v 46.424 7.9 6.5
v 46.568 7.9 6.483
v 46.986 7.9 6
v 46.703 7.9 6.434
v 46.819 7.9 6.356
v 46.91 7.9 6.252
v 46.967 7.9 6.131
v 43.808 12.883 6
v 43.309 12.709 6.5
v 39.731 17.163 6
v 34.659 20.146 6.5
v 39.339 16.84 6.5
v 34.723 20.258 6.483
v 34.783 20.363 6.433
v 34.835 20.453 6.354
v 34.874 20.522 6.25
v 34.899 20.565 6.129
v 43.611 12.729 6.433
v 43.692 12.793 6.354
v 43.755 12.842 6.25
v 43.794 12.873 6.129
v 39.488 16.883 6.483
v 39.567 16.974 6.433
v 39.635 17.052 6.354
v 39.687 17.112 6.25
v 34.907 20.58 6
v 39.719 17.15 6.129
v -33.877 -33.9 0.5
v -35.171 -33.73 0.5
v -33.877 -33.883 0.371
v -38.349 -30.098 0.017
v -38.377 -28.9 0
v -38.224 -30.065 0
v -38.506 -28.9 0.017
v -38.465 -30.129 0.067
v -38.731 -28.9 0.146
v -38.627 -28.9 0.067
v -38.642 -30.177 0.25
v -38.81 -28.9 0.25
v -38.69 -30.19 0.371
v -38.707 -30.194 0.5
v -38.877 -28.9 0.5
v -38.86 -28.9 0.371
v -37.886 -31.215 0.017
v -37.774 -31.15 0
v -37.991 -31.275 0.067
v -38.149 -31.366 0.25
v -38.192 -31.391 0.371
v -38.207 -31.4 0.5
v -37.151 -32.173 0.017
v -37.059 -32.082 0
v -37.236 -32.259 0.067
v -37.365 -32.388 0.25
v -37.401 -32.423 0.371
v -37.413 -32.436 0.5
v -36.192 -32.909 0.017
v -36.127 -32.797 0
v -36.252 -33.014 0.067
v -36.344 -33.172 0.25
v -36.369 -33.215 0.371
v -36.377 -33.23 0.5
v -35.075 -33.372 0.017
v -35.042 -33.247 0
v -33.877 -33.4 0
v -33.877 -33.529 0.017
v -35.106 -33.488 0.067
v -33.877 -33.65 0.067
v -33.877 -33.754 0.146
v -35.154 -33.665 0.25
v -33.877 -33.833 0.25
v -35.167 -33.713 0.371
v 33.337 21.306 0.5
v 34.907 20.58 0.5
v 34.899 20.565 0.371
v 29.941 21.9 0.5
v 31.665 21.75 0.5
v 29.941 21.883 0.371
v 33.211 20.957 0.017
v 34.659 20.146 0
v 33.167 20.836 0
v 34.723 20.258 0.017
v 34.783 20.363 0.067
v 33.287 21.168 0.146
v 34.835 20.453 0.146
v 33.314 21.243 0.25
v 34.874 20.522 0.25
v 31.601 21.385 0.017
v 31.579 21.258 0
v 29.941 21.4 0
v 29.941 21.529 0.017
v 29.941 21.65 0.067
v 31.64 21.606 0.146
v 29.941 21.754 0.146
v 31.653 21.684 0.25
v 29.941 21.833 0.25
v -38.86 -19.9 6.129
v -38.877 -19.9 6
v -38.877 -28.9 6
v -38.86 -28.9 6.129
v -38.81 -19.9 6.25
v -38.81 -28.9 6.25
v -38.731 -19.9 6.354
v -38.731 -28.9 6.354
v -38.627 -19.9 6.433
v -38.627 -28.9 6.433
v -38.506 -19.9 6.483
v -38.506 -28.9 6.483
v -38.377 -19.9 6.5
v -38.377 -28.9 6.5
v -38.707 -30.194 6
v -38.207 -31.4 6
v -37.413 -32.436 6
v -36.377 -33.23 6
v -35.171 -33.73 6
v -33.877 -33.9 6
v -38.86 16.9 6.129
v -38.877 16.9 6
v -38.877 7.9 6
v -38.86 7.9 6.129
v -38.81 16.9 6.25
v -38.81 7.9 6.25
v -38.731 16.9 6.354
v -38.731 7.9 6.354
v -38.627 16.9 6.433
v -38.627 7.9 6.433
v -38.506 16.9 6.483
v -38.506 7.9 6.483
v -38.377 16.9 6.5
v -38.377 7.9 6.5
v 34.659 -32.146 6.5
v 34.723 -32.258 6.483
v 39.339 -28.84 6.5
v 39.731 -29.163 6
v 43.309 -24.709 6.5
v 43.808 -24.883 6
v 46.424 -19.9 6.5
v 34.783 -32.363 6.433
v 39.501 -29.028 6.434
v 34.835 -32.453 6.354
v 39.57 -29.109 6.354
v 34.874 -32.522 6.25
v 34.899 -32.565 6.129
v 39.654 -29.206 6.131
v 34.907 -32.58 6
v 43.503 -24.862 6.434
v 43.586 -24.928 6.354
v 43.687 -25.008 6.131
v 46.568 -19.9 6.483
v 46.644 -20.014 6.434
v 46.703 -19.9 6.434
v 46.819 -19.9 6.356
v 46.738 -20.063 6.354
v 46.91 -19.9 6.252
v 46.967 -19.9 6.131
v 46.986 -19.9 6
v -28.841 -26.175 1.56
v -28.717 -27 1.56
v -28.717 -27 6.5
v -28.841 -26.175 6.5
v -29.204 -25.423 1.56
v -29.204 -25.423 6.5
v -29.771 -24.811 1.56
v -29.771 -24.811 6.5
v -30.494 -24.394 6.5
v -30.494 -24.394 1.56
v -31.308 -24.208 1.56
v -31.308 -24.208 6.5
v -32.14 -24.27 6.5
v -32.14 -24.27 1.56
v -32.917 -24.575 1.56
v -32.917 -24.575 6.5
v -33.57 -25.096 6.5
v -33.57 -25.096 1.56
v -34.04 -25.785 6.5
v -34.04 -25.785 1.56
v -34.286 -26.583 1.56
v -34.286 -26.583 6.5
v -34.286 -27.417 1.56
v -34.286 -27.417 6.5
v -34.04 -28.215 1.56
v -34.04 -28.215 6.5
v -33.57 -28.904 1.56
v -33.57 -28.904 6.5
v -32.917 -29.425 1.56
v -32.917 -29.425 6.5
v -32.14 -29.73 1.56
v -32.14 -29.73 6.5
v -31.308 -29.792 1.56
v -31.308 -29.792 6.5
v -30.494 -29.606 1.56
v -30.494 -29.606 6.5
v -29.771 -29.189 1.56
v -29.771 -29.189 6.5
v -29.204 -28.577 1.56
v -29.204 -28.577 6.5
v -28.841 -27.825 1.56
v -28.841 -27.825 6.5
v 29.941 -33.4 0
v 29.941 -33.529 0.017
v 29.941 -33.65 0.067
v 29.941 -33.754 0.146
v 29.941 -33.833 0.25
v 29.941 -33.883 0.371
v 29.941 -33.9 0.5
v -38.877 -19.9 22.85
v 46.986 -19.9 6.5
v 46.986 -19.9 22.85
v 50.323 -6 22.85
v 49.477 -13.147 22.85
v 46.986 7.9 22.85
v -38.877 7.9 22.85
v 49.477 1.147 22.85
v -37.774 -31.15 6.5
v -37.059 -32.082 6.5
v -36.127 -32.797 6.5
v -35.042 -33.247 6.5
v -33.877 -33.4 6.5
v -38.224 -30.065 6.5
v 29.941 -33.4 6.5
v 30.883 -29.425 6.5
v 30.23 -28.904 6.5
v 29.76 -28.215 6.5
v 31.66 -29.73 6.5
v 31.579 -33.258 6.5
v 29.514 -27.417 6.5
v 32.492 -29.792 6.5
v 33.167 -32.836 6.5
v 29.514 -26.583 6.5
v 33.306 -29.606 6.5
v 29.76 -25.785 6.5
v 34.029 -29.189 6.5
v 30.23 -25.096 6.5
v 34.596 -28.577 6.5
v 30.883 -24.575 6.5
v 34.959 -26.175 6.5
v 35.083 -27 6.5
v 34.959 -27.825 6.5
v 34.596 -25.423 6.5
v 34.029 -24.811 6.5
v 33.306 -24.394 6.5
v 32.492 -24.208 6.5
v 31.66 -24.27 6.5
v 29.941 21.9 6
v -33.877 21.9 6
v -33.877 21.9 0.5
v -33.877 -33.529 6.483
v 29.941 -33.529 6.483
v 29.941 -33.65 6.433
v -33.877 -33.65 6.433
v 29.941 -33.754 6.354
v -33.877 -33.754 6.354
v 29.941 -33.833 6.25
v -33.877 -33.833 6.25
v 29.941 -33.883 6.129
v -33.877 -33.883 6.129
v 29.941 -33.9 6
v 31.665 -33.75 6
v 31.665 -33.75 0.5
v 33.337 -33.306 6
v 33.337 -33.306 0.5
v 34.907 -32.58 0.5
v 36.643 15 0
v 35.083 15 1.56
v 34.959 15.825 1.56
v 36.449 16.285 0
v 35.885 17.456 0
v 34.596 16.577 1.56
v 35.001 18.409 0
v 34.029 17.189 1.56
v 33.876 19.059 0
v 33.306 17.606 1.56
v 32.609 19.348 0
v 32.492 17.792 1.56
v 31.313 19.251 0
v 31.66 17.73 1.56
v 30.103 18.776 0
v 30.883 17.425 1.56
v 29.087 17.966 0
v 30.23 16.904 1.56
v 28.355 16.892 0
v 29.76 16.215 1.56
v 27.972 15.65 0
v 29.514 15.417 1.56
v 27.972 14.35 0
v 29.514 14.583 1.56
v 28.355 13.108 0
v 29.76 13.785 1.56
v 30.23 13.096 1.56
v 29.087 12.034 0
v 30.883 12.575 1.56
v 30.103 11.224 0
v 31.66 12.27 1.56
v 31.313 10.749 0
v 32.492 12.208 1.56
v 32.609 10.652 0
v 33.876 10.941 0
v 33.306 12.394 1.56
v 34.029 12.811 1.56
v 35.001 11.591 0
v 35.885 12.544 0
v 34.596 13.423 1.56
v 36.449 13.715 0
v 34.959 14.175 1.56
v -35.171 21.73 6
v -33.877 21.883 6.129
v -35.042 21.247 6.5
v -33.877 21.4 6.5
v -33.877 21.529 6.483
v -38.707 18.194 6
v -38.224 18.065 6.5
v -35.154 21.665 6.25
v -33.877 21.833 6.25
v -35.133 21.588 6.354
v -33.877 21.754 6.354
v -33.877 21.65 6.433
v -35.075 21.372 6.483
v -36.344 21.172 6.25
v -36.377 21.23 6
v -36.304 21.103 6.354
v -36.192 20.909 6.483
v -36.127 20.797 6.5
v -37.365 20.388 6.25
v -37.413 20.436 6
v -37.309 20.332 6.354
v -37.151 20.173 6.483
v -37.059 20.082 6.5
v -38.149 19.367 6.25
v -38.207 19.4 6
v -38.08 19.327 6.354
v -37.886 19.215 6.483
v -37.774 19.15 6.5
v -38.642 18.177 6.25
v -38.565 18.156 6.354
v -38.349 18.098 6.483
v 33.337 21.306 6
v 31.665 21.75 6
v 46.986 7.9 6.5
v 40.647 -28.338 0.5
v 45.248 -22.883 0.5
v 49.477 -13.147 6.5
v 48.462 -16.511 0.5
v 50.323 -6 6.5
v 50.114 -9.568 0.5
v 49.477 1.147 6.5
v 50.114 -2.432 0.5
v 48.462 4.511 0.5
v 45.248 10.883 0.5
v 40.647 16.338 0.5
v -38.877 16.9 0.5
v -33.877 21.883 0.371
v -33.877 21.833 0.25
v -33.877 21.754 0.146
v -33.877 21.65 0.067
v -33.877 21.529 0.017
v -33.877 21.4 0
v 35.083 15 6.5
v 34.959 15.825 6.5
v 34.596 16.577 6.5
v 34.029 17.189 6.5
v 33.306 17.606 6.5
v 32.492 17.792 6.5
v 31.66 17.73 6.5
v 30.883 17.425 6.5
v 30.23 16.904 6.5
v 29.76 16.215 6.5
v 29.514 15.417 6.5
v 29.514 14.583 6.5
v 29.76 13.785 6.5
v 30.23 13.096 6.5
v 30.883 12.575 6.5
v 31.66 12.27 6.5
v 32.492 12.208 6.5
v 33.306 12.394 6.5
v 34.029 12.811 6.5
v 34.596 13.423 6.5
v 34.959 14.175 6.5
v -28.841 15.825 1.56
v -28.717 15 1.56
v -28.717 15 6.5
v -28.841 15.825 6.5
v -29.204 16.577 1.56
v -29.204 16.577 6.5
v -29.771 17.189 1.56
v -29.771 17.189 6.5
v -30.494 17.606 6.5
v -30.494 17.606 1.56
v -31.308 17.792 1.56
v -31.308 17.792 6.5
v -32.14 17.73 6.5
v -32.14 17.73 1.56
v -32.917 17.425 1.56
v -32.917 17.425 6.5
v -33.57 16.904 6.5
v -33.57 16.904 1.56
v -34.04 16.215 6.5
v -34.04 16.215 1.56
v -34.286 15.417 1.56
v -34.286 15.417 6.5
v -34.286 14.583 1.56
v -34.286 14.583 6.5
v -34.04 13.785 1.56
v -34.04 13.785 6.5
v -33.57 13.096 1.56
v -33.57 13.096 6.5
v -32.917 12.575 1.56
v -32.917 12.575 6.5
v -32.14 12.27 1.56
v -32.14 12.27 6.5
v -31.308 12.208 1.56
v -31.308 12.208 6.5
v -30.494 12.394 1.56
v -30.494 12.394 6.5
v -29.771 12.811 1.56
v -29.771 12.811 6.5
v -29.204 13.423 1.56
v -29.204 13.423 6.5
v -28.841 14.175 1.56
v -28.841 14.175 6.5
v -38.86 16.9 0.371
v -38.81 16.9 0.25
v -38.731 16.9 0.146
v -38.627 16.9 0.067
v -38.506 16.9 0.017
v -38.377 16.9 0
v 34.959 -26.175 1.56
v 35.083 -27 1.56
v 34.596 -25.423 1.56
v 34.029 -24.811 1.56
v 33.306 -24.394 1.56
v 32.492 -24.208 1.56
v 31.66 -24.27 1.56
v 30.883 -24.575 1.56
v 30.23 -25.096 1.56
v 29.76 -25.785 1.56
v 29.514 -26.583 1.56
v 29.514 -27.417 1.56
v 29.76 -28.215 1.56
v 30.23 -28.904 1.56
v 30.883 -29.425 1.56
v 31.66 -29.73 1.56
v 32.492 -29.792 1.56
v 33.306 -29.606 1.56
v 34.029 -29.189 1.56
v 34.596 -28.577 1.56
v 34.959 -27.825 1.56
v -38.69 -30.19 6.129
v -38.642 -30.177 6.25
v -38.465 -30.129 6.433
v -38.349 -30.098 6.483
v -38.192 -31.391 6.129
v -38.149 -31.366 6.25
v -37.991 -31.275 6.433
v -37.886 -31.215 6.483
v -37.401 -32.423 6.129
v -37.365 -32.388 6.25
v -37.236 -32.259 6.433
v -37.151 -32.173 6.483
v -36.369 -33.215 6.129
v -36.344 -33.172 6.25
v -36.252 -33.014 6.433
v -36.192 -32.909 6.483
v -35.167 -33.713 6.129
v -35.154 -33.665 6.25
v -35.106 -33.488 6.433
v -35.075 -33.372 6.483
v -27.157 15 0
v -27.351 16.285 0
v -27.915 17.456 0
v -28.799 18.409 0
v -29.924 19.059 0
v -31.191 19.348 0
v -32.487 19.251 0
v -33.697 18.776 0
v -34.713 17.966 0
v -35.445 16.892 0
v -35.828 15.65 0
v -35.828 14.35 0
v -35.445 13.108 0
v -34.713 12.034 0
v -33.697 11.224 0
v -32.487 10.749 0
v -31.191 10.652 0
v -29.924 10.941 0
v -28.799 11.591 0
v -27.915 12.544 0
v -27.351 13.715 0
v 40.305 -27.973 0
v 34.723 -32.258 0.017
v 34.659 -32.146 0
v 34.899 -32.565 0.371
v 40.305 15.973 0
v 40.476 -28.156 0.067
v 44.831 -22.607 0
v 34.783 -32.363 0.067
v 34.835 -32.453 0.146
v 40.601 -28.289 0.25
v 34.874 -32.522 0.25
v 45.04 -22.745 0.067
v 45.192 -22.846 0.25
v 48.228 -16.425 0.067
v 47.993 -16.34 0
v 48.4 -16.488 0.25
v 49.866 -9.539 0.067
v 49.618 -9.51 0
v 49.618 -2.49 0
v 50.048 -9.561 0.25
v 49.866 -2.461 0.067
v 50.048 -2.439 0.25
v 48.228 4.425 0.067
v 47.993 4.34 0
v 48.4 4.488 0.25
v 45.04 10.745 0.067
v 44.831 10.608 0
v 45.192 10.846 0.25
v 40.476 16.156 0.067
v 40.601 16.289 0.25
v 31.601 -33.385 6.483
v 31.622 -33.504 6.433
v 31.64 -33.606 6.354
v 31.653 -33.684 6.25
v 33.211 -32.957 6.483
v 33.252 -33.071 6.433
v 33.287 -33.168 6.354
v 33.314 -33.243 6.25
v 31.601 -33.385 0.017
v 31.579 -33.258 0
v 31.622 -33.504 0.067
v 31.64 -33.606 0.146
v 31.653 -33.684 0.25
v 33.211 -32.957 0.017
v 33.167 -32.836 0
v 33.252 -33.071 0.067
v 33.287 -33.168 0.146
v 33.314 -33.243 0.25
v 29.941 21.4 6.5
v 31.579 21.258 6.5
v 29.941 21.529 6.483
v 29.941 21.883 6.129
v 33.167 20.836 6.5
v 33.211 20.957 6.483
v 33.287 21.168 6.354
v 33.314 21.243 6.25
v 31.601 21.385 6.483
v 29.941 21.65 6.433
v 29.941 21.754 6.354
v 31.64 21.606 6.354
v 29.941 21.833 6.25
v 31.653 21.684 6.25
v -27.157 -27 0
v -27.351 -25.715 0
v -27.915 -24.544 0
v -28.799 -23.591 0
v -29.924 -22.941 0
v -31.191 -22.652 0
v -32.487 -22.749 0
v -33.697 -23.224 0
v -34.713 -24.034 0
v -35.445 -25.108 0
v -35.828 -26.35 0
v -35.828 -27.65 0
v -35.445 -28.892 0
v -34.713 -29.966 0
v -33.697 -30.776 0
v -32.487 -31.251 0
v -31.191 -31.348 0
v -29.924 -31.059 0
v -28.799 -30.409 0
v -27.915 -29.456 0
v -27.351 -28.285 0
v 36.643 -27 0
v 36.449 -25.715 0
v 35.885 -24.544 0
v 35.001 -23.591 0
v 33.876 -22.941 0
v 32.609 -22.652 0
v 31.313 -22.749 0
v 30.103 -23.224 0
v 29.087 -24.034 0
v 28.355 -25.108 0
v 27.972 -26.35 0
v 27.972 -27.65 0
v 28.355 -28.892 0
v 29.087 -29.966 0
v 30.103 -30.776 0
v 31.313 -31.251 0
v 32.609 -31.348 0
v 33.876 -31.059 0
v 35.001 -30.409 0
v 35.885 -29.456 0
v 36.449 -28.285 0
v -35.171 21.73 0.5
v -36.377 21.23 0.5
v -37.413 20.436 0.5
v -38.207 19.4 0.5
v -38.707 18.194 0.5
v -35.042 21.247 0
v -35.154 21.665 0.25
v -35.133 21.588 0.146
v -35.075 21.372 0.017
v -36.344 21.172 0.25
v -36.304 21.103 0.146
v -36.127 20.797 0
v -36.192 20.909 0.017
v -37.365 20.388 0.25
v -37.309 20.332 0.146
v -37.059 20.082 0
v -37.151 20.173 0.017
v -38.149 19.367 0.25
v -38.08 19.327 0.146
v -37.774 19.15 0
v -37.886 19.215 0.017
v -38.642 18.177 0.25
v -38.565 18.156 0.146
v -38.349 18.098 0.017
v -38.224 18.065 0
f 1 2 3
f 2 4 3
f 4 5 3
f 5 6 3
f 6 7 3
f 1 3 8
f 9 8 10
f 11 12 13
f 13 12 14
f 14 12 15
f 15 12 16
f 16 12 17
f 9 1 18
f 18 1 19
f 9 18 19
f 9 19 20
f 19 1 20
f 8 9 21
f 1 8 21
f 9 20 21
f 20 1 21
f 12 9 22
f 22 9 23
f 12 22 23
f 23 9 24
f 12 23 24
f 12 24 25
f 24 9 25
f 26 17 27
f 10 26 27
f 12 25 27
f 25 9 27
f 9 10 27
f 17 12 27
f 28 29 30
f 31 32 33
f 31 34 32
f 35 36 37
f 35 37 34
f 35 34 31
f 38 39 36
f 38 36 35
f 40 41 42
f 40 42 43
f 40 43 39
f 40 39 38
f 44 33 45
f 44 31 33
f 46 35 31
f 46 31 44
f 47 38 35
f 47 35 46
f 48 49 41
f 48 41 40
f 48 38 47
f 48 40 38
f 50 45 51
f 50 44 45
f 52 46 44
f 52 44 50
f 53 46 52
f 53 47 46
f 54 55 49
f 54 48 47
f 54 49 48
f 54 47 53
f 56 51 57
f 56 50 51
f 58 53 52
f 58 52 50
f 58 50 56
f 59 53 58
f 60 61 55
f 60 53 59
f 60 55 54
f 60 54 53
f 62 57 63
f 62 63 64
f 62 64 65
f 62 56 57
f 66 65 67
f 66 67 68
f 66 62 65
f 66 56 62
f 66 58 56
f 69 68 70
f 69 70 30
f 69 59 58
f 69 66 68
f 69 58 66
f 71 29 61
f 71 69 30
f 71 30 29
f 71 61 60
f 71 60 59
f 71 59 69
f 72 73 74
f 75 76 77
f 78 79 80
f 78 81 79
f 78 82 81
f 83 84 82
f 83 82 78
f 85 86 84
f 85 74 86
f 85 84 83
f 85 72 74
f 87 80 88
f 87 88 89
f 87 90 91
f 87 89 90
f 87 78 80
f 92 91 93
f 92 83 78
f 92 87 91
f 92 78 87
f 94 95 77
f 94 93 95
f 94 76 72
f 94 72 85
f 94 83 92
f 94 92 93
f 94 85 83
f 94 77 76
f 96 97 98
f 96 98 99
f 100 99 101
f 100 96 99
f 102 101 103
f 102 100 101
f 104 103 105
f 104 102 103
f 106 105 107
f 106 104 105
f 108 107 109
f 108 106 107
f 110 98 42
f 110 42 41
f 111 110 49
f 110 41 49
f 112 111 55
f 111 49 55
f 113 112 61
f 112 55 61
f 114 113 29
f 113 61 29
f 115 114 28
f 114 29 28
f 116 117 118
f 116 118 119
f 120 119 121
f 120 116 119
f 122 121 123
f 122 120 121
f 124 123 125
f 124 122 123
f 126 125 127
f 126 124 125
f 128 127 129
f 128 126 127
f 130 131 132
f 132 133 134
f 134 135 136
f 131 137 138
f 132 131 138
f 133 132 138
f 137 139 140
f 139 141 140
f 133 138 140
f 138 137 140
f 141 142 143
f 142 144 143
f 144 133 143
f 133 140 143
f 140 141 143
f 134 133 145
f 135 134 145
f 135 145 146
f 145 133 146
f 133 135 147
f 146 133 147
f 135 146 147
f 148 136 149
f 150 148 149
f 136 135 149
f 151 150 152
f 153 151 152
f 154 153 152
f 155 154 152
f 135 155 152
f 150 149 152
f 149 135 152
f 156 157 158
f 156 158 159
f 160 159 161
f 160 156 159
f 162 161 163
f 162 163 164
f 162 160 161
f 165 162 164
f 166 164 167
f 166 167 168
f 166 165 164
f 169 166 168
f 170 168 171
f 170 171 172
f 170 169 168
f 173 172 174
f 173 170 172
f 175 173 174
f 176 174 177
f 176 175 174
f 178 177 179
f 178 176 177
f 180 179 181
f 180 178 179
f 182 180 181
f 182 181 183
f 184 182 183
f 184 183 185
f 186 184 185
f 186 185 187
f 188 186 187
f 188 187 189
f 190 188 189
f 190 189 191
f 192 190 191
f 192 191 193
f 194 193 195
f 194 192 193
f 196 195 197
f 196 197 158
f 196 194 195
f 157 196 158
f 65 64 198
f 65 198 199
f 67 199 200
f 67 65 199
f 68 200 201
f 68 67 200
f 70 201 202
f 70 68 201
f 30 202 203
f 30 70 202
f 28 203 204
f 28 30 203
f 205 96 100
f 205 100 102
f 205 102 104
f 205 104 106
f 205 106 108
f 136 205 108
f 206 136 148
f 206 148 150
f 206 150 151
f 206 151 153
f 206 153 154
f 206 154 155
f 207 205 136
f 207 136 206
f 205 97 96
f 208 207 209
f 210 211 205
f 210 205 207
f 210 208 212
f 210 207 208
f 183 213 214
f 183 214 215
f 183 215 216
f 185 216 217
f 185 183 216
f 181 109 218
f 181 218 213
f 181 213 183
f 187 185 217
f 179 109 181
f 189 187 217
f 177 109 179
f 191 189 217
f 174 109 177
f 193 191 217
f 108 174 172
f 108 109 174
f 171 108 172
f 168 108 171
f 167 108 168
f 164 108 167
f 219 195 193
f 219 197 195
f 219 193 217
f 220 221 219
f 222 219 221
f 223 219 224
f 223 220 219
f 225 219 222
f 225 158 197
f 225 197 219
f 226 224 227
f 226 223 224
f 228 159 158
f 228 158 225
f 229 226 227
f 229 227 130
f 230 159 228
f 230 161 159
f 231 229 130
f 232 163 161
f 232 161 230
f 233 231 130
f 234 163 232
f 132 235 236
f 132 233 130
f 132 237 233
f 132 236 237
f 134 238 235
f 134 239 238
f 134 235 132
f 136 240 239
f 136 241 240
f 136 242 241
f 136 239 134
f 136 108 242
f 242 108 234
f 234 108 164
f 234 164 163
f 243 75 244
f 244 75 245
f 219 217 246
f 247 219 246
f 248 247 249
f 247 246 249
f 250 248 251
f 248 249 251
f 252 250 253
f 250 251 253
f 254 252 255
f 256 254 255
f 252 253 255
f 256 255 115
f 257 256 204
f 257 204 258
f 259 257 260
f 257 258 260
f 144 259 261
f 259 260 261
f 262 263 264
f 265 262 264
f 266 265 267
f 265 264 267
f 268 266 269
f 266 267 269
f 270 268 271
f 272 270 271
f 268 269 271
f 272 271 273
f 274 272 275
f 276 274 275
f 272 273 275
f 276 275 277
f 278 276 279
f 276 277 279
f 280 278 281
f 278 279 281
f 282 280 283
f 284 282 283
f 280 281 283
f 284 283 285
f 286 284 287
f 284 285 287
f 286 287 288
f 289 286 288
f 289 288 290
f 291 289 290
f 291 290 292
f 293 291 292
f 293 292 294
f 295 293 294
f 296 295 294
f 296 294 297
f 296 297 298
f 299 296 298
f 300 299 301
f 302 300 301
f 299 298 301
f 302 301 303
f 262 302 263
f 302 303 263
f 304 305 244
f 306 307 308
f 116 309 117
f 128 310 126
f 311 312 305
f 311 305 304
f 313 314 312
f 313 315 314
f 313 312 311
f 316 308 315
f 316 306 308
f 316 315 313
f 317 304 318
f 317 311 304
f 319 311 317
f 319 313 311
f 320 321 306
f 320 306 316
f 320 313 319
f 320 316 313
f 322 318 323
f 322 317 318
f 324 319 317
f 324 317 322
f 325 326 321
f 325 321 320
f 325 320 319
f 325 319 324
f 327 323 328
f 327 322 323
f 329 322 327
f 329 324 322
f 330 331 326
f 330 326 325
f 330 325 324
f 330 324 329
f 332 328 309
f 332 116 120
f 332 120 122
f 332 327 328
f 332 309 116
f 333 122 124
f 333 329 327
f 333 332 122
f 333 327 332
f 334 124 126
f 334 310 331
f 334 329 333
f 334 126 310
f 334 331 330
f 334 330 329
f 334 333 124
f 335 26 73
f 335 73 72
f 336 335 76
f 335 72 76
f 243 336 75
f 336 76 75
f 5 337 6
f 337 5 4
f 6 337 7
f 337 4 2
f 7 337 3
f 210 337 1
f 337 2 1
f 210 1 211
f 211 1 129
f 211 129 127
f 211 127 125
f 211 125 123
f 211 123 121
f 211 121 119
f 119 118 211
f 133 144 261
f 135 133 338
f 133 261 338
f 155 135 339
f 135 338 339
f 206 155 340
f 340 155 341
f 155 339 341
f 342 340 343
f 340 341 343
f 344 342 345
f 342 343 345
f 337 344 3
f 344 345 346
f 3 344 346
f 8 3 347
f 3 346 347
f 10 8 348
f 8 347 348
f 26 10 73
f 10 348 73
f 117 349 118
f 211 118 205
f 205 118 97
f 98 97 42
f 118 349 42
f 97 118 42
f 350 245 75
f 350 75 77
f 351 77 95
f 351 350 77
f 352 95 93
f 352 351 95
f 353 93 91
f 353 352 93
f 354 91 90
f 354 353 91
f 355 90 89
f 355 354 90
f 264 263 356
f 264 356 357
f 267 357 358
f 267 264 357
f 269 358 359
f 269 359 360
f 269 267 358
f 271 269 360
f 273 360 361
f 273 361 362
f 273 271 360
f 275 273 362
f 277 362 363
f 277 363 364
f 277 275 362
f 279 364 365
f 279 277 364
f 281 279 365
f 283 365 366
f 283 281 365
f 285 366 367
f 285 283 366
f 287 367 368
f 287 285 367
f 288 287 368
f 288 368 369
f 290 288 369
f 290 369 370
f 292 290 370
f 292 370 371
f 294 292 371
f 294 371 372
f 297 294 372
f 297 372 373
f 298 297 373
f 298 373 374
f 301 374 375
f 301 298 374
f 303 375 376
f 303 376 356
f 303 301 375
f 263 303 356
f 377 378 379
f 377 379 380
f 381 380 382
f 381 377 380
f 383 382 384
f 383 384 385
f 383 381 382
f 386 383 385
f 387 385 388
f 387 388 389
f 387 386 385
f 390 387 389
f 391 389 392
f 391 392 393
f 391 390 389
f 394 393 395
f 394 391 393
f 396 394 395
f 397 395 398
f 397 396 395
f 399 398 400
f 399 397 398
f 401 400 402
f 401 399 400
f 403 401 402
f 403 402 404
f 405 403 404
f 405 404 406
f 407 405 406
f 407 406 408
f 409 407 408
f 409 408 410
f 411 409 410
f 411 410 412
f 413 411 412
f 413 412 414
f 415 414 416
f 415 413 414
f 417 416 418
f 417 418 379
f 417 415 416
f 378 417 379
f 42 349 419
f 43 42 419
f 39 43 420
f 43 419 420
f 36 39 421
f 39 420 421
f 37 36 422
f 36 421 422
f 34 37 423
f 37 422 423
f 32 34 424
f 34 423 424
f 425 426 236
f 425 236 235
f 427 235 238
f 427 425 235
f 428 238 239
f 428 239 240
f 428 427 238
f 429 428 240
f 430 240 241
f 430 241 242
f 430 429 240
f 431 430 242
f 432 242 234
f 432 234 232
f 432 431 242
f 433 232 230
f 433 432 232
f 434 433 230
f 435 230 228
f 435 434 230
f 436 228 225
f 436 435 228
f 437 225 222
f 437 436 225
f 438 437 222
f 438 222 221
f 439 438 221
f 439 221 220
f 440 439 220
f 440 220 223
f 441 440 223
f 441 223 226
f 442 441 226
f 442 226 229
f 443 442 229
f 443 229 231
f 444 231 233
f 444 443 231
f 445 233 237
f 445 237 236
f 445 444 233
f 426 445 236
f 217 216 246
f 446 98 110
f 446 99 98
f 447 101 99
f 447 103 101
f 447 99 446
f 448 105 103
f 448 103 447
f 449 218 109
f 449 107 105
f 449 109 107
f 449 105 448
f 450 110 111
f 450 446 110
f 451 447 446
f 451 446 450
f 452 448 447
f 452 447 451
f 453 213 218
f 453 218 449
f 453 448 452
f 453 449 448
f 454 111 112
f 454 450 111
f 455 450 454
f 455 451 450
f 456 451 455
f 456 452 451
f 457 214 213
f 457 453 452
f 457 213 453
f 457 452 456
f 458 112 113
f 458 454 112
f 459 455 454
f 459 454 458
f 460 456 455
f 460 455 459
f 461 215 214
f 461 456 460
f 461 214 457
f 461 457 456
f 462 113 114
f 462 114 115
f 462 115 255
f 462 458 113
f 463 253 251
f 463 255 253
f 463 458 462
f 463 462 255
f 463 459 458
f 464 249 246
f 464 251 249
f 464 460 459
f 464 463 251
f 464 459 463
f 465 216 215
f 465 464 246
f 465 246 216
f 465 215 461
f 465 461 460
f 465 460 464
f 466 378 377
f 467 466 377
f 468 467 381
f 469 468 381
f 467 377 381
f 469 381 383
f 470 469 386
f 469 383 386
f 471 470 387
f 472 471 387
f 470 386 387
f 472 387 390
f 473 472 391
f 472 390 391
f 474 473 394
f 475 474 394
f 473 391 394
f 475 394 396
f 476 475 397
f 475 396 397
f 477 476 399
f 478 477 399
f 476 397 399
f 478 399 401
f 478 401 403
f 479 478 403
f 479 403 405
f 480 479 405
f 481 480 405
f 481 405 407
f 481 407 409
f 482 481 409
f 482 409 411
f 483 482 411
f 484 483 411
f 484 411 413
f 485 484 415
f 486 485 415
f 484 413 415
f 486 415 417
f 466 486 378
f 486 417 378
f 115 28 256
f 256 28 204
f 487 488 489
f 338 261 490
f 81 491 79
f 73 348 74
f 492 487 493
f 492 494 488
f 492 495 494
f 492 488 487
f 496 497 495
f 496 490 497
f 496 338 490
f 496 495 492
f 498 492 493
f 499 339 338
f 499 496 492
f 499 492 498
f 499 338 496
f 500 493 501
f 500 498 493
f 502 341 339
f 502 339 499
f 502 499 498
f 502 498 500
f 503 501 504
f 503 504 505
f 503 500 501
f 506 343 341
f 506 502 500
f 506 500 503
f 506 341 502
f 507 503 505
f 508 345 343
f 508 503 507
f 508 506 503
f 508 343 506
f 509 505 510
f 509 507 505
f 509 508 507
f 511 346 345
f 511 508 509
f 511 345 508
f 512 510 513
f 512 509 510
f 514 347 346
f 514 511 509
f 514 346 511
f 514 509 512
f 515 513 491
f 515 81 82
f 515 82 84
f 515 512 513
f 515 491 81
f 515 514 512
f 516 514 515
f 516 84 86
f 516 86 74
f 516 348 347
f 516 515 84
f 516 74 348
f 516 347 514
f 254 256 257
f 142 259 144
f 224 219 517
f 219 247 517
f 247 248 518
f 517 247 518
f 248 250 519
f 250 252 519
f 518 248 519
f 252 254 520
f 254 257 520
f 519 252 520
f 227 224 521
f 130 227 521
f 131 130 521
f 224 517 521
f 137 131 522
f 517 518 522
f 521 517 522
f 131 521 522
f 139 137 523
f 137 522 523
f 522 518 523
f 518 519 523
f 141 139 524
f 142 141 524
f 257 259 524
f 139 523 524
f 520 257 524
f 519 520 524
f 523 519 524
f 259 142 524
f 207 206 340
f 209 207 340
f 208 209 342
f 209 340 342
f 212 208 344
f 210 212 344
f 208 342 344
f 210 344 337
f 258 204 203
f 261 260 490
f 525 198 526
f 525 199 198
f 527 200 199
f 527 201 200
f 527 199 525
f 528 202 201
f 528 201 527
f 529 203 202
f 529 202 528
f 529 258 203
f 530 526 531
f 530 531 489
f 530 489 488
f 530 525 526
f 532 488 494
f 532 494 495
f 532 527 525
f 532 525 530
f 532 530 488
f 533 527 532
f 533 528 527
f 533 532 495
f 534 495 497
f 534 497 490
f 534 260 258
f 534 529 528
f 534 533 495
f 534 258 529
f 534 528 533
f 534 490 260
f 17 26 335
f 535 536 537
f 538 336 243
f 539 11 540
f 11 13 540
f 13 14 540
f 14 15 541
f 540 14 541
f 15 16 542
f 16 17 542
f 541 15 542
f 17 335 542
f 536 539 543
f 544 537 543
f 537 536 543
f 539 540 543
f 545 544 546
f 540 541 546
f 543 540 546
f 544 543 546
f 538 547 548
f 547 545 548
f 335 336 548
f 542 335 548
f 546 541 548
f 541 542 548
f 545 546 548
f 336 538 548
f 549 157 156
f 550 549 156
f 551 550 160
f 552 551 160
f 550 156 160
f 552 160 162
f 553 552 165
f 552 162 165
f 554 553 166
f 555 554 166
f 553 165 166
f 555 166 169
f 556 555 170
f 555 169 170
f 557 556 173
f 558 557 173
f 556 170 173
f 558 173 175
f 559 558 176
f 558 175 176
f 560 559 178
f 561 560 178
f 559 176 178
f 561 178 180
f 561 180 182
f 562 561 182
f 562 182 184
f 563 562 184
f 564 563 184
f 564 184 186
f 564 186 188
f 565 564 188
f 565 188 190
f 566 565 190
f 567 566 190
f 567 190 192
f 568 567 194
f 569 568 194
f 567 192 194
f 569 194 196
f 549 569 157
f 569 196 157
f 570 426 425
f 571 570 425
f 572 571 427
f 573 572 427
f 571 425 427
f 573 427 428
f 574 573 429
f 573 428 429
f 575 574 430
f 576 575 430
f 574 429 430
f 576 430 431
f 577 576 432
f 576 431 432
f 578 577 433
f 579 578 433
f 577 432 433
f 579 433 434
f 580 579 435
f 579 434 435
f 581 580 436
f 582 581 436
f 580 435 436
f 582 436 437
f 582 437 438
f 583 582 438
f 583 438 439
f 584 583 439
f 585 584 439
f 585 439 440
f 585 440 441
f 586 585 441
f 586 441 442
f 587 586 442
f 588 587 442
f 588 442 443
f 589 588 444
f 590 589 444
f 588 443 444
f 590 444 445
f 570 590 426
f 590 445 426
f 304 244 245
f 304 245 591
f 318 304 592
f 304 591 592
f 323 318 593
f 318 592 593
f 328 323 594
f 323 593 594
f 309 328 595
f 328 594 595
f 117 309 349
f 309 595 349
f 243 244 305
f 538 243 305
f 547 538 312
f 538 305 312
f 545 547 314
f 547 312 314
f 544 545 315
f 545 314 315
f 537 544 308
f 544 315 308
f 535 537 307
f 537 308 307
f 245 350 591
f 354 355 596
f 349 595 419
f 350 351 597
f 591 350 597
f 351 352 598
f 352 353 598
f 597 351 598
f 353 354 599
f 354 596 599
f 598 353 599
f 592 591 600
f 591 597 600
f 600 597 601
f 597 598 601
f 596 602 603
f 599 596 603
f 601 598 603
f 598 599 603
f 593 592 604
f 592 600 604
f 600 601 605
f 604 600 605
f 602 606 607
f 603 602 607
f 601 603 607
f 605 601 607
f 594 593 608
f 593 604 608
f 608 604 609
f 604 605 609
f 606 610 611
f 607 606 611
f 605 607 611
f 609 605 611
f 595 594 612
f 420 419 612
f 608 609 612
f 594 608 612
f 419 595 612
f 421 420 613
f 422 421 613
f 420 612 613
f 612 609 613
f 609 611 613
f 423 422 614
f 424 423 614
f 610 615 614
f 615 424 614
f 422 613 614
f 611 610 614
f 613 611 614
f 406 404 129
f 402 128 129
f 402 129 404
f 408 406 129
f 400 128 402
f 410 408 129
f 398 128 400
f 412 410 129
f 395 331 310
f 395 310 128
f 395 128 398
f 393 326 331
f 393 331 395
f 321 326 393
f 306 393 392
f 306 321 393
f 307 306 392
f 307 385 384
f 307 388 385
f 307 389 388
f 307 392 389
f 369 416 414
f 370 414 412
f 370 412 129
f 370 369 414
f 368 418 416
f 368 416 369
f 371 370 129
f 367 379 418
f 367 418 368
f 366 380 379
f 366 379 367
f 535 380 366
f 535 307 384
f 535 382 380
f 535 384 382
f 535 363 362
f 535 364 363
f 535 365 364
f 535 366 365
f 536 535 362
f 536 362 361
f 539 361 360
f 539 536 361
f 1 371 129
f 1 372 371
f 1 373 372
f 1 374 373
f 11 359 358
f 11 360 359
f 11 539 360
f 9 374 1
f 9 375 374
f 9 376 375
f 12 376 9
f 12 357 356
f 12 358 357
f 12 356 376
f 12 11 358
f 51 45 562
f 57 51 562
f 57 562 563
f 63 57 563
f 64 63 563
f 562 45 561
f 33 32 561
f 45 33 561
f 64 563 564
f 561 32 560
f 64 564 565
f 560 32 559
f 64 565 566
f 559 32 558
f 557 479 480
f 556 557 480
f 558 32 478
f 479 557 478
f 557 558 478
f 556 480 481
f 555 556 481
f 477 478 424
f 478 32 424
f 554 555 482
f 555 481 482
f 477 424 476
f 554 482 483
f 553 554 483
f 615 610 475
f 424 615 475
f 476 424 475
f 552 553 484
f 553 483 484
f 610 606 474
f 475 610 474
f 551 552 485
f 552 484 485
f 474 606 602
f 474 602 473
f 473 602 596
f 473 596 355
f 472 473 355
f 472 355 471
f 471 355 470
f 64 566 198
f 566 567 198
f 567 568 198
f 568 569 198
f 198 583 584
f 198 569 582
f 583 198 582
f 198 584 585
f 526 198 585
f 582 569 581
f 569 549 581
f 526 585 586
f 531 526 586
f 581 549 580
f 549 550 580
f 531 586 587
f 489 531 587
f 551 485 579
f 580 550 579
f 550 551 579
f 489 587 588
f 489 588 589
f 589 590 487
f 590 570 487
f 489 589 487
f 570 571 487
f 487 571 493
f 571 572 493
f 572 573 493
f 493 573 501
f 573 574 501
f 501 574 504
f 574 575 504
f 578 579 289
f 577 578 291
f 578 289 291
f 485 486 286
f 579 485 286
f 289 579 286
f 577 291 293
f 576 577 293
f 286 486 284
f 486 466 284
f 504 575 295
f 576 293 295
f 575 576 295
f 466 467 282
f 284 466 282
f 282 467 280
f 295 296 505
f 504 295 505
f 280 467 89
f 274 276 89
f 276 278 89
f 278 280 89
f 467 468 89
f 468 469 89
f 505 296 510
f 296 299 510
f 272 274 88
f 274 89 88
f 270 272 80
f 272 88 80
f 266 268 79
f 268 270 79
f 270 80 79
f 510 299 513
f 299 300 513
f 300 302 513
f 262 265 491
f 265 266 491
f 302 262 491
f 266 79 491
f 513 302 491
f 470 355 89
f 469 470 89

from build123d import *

# Parameters (mm, degrees)
F0_R         = 2.8
F1_DEPTH     = 6.5
F3_DEPTH     = 16.35
F4_T1_DEPTH  = 63.8184719387
F4_T3_DEPTH  = 45.8
F4_T5_DEPTH  = 9
F4_T7_DEPTH  = 9
F4_T10_ANGLE = 90
F4_T12_ANGLE = 120.4504110916
F4_T14_ANGLE = 90
F4_T16_ANGLE = 90
F4_T18_ANGLE = 29.7747944542
F4_T20_ANGLE = 29.7747944542
F4_T22_ANGLE = 29.7747944542
F4_T26_ANGLE = 35.5690080159
F4_T29_ANGLE = 90
F4_T33_ANGLE = 35.5690080159
F4_T36_ANGLE = 29.7747944542
F5_SIZE      = 1.56


# Not quite as in the source:
# - a fillet or chamfer that OpenCascade refuses, or shapes differently, is made with other operations: its cross-section is extruded or revolved along the edge and cut away or added


with BuildPart() as f1:
    # F0 (on Top) → F1 (new body)
    with BuildSketch(Plane.XY):
        with BuildLine():
            Line((-38.8770699501, 16.9000072956), (-38.8770699501, -28.8999927044))
            ThreePointArc((-38.8770699501, -28.8999927044), (-37.412603856, -32.4355266103), (-33.8770699501, -33.8999927044))
            Line((-33.8770699501, -33.8999927044), (29.9414019886, -33.8999927044))
            ThreePointArc((29.9414019886, -33.8999927044), (32.5106042183, -33.5643188528), (34.9073236464, -32.579832685))
            ThreePointArc((34.9073236464, -32.579832685), (50.3229300499, -5.9999927044), (34.9073236464, 20.5798472762))
            ThreePointArc((34.9073236464, 20.5798472762), (32.5106042183, 21.564333444), (29.9414019886, 21.9000072956))
            Line((29.9414019886, 21.9000072956), (-33.8770699501, 21.9000072956))
            ThreePointArc((-33.8770699501, 21.9000072956), (-37.412603856, 20.4355412015), (-38.8770699501, 16.9000072956))
        make_face()
        with Locations((-31.5170697868, -26.9999932498)):
            Circle(F0_R, mode=Mode.SUBTRACT)
        with Locations((32.2829300499, -26.9999927044)):
            Circle(F0_R, mode=Mode.SUBTRACT)
        with Locations((-31.5170697868, 15.0000071153)):
            Circle(F0_R, mode=Mode.SUBTRACT)
        with Locations((32.2829300499, 15.0000072956)):
            Circle(F0_R, mode=Mode.SUBTRACT)
    extrude(amount=F1_DEPTH)

    # F2 (on face) → F3 (join)
    with BuildSketch(Plane.XY.offset(6.5)):
        with BuildLine():
            Line((-38.8770699501, 7.9000072956), (-38.8770699501, -5.9999927044))
            Line((-38.8770699501, -5.9999927044), (-38.8770699501, -19.8999927044))
            Line((-38.8770699501, -19.8999927044), (46.9864613892, -19.8999927044))
            ThreePointArc((46.9864613892, -19.8999927044), (50.3229300499, -5.9999927044), (46.9864613892, 7.9000072956))
            Line((46.9864613892, 7.9000072956), (-38.8770699501, 7.9000072956))
        make_face()
    extrude(amount=F3_DEPTH)

    # F4: fillet of radius 0.5 on 18 edges, made by hand

    # F4_s2 → F4_t1 (cut)
    with BuildSketch(Plane.YZ.offset(-33.8770699501)):
        with BuildLine():
            ThreePointArc((21.9000072956, 0.5), (21.7535606862, 0.1464466094), (21.4000072956, 0))
            Line((21.4000072956, 0), (21.9000072956, 0))
            Line((21.9000072956, 0), (21.9000072956, 0.5))
        make_face()
        with BuildLine():
            ThreePointArc((21.9000072956, 6), (21.7535606862, 6.3535533906), (21.4000072956, 6.5))
            Line((21.4000072956, 6.5), (21.9000072956, 6.5))
            Line((21.9000072956, 6.5), (21.9000072956, 6))
        make_face()
        with BuildLine():
            ThreePointArc((-33.3999927044, 6.5), (-33.753546095, 6.3535533906), (-33.8999927044, 6))
            Line((-33.8999927044, 6), (-33.8999927044, 6.5))
            Line((-33.8999927044, 6.5), (-33.3999927044, 6.5))
        make_face()
        with BuildLine():
            ThreePointArc((-33.3999927044, 0), (-33.753546095, 0.1464466094), (-33.8999927044, 0.5))
            Line((-33.8999927044, 0.5), (-33.8999927044, 0))
            Line((-33.8999927044, 0), (-33.3999927044, 0))
        make_face()
    extrude(amount=F4_T1_DEPTH, mode=Mode.SUBTRACT)

    # F4_s4 → F4_t3 (cut)
    with BuildSketch(Plane.XZ.offset(-16.9000072956)):
        with BuildLine():
            ThreePointArc((-38.8770699501, 0.5), (-38.7306233407, 0.1464466094), (-38.3770699501, 0))
            Line((-38.3770699501, 0), (-38.8770699501, 0))
            Line((-38.8770699501, 0), (-38.8770699501, 0.5))
        make_face()
    extrude(amount=F4_T3_DEPTH, mode=Mode.SUBTRACT)

    # F4_s6 → F4_t5 (cut)
    with BuildSketch(Plane.XZ.offset(-16.9000072956)):
        with BuildLine():
            ThreePointArc((-38.8770699501, 6), (-38.7306233407, 6.3535533906), (-38.3770699501, 6.5))
            Line((-38.3770699501, 6.5), (-38.8770699501, 6.5))
            Line((-38.8770699501, 6.5), (-38.8770699501, 6))
        make_face()
    extrude(amount=F4_T5_DEPTH, mode=Mode.SUBTRACT)

    # F4_s8 → F4_t7 (cut)
    with BuildSketch(Plane.XZ.offset(19.8999927044)):
        with BuildLine():
            ThreePointArc((-38.8770699501, 6), (-38.7306233407, 6.3535533906), (-38.3770699501, 6.5))
            Line((-38.3770699501, 6.5), (-38.8770699501, 6.5))
            Line((-38.8770699501, 6.5), (-38.8770699501, 6))
        make_face()
    extrude(amount=F4_T7_DEPTH, mode=Mode.SUBTRACT)

    # F4_s9 → F4_t10 (revolve, cut)
    with BuildSketch(Plane.YZ.offset(-33.8770699501)):
        with BuildLine():
            ThreePointArc((21.9000072956, 0.5), (21.7535606862, 0.1464466094), (21.4000072956, 0))
            Line((21.4000072956, 0), (21.9000072956, 0))
            Line((21.9000072956, 0), (21.9000072956, 0.5))
        make_face()
    revolve(axis=Axis((-33.8770699501, 16.9000072956, 0), (0, 0, 1)), revolution_arc=F4_T10_ANGLE, mode=Mode.SUBTRACT)

    # F4_s11 → F4_t12 (revolve, cut)
    with BuildSketch(Plane(origin=(12.2560283734, 7.0119353437, 0), x_dir=(0, 0, 1), z_dir=(-0.8679839981, -0.4965921658, 0))):
        with BuildLine():
            ThreePointArc((0, -45.1134768811), (0.1464466094, -45.4670302717), (0.5, -45.6134768811))
            Line((0.5, -45.6134768811), (0, -45.6134768811))
            Line((0, -45.6134768811), (0, -45.1134768811))
        make_face()
    revolve(axis=Axis((19.7004300499, -5.9999927044, 0), (0, 0, 1)), revolution_arc=F4_T12_ANGLE, mode=Mode.SUBTRACT)

    # F4_s13 → F4_t14 (revolve, cut)
    with BuildSketch(Plane.YZ.offset(-33.8770699501)):
        with BuildLine():
            ThreePointArc((21.9000072956, 6), (21.7535606862, 6.3535533906), (21.4000072956, 6.5))
            Line((21.4000072956, 6.5), (21.9000072956, 6.5))
            Line((21.9000072956, 6.5), (21.9000072956, 6))
        make_face()
    revolve(axis=Axis((-33.8770699501, 16.9000072956, 6.5), (0, 0, 1)), revolution_arc=F4_T14_ANGLE, mode=Mode.SUBTRACT)

    # F4_s15 → F4_t16 (revolve, cut)
    with BuildSketch(Plane.XZ.offset(28.8999927044)):
        with BuildLine():
            ThreePointArc((-38.3770699501, 0), (-38.7306233407, 0.1464466094), (-38.8770699501, 0.5))
            Line((-38.8770699501, 0.5), (-38.8770699501, 0))
            Line((-38.8770699501, 0), (-38.3770699501, 0))
        make_face()
    revolve(axis=Axis((-33.8770699501, -28.8999927044, 0), (0, 0, 1)), revolution_arc=F4_T16_ANGLE, mode=Mode.SUBTRACT)

    # F4_s17 → F4_t18 (revolve, cut)
    with BuildSketch(Plane.YZ.offset(29.9414019886)):
        with BuildLine():
            ThreePointArc((-33.3999927044, 0), (-33.753546095, 0.1464466094), (-33.8999927044, 0.5))
            Line((-33.8999927044, 0.5), (-33.8999927044, 0))
            Line((-33.8999927044, 0), (-33.3999927044, 0))
        make_face()
    revolve(axis=Axis((29.9414019886, -23.8999927044, 0), (0, 0, 1)), revolution_arc=F4_T18_ANGLE, mode=Mode.SUBTRACT)

    # F4_s19 → F4_t20 (revolve, cut)
    with BuildSketch(Plane(origin=(17.4284307256, -9.9711770948, 0), x_dir=(0, 0, 1), z_dir=(0.8679839981, -0.4965921658, 0))):
        with BuildLine():
            ThreePointArc((0, -34.6976815693), (0.1464466094, -35.0512349599), (0.5, -35.1976815693))
            Line((0.5, -35.1976815693), (0, -35.1976815693))
            Line((0, -35.1976815693), (0, -34.6976815693))
        make_face()
    revolve(axis=Axis((29.9414019886, 11.9000072956, 0), (0, 0, 1)), revolution_arc=F4_T20_ANGLE, mode=Mode.SUBTRACT)

    # F4_s21 → F4_t22 (revolve, cut)
    with BuildSketch(Plane(origin=(17.4284307256, -9.9711770948, 0), x_dir=(0, 0, 1), z_dir=(0.8679839981, -0.4965921658, 0))):
        with BuildLine():
            ThreePointArc((6.5, -34.6976815693), (6.3535533906, -35.0512349599), (6, -35.1976815693))
            Line((6, -35.1976815693), (6.5, -35.1976815693))
            Line((6.5, -35.1976815693), (6.5, -34.6976815693))
        make_face()
    revolve(axis=Axis((29.9414019886, 11.9000072956, 6.5), (0, 0, 1)), revolution_arc=F4_T22_ANGLE, mode=Mode.SUBTRACT)


with BuildPart() as f4_tool24:
    # F4_s25 → F4_t26 (revolve)
    with BuildSketch(Plane(origin=(5.7033446243, -12.4249727464, 0), x_dir=(0, 0, 1), z_dir=(0.4171723997, -0.9088273703, 0))):
        with BuildLine():
            ThreePointArc((6.5, -45.5237586807), (6.3535533906, -45.8773120713), (6, -46.0237586807))
            Line((6, -46.0237586807), (6.5, -46.0237586807))
            Line((6.5, -46.0237586807), (6.5, -45.5237586807))
        make_face()
    revolve(axis=Axis((19.7004300499, -5.9999927044, 6.5), (0, 0, 1)), revolution_arc=F4_T26_ANGLE)

    split(bisect_by=Plane.XZ.offset(-7.9000072956), keep=Keep.BOTTOM)


with BuildPart() as f1_1:
    add(f1.part)

    # F4_t23: cut F4_tool24
    add(f4_tool24.part, mode=Mode.SUBTRACT)

    # F4_s28 → F4_t29 (revolve, cut)
    with BuildSketch(Plane.XZ.offset(28.8999927044)):
        with BuildLine():
            ThreePointArc((-38.8770699501, 6), (-38.7306233407, 6.3535533906), (-38.3770699501, 6.5))
            Line((-38.3770699501, 6.5), (-38.8770699501, 6.5))
            Line((-38.8770699501, 6.5), (-38.8770699501, 6))
        make_face()
    revolve(axis=Axis((-33.8770699501, -28.8999927044, 6.5), (0, 0, 1)), revolution_arc=F4_T29_ANGLE, mode=Mode.SUBTRACT)


with BuildPart() as f4_tool31:
    # F4_s32 → F4_t33 (revolve)
    with BuildSketch(Plane(origin=(12.2560283734, 7.0119353437, 0), x_dir=(0, 0, 1), z_dir=(-0.8679839981, -0.4965921658, 0))):
        with BuildLine():
            ThreePointArc((6.5, -45.1134768811), (6.3535533906, -45.4670302717), (6, -45.6134768811))
            Line((6, -45.6134768811), (6.5, -45.6134768811))
            Line((6.5, -45.6134768811), (6.5, -45.1134768811))
        make_face()
    revolve(axis=Axis((19.7004300499, -5.9999927044, 6.5), (0, 0, 1)), revolution_arc=F4_T33_ANGLE)

    split(bisect_by=Plane.XZ.offset(19.8999927044), keep=Keep.TOP)


with BuildPart() as f1_2:
    add(f1_1.part)

    # F4_t30: cut F4_tool31
    add(f4_tool31.part, mode=Mode.SUBTRACT)

    # F4_s35 → F4_t36 (revolve, cut)
    with BuildSketch(Plane.YZ.offset(29.9414019886)):
        with BuildLine():
            ThreePointArc((-33.3999927044, 6.5), (-33.753546095, 6.3535533906), (-33.8999927044, 6))
            Line((-33.8999927044, 6), (-33.8999927044, 6.5))
            Line((-33.8999927044, 6.5), (-33.3999927044, 6.5))
        make_face()
    revolve(axis=Axis((29.9414019886, -23.8999927044, 6.5), (0, 0, 1)), revolution_arc=F4_T36_ANGLE, mode=Mode.SUBTRACT)

    # F5
    f5_edges = [f1_2.edges().sort_by_distance(p)[0] for p in [
        (-34.31707, 15.000007, 0),
        (-34.31707, -26.999993, 0),
        (29.48293, -26.999993, 0),
        (29.48293, 15.000007, 0),
    ]]
    chamfer(f5_edges, length=F5_SIZE)


solid = f1_2.part
